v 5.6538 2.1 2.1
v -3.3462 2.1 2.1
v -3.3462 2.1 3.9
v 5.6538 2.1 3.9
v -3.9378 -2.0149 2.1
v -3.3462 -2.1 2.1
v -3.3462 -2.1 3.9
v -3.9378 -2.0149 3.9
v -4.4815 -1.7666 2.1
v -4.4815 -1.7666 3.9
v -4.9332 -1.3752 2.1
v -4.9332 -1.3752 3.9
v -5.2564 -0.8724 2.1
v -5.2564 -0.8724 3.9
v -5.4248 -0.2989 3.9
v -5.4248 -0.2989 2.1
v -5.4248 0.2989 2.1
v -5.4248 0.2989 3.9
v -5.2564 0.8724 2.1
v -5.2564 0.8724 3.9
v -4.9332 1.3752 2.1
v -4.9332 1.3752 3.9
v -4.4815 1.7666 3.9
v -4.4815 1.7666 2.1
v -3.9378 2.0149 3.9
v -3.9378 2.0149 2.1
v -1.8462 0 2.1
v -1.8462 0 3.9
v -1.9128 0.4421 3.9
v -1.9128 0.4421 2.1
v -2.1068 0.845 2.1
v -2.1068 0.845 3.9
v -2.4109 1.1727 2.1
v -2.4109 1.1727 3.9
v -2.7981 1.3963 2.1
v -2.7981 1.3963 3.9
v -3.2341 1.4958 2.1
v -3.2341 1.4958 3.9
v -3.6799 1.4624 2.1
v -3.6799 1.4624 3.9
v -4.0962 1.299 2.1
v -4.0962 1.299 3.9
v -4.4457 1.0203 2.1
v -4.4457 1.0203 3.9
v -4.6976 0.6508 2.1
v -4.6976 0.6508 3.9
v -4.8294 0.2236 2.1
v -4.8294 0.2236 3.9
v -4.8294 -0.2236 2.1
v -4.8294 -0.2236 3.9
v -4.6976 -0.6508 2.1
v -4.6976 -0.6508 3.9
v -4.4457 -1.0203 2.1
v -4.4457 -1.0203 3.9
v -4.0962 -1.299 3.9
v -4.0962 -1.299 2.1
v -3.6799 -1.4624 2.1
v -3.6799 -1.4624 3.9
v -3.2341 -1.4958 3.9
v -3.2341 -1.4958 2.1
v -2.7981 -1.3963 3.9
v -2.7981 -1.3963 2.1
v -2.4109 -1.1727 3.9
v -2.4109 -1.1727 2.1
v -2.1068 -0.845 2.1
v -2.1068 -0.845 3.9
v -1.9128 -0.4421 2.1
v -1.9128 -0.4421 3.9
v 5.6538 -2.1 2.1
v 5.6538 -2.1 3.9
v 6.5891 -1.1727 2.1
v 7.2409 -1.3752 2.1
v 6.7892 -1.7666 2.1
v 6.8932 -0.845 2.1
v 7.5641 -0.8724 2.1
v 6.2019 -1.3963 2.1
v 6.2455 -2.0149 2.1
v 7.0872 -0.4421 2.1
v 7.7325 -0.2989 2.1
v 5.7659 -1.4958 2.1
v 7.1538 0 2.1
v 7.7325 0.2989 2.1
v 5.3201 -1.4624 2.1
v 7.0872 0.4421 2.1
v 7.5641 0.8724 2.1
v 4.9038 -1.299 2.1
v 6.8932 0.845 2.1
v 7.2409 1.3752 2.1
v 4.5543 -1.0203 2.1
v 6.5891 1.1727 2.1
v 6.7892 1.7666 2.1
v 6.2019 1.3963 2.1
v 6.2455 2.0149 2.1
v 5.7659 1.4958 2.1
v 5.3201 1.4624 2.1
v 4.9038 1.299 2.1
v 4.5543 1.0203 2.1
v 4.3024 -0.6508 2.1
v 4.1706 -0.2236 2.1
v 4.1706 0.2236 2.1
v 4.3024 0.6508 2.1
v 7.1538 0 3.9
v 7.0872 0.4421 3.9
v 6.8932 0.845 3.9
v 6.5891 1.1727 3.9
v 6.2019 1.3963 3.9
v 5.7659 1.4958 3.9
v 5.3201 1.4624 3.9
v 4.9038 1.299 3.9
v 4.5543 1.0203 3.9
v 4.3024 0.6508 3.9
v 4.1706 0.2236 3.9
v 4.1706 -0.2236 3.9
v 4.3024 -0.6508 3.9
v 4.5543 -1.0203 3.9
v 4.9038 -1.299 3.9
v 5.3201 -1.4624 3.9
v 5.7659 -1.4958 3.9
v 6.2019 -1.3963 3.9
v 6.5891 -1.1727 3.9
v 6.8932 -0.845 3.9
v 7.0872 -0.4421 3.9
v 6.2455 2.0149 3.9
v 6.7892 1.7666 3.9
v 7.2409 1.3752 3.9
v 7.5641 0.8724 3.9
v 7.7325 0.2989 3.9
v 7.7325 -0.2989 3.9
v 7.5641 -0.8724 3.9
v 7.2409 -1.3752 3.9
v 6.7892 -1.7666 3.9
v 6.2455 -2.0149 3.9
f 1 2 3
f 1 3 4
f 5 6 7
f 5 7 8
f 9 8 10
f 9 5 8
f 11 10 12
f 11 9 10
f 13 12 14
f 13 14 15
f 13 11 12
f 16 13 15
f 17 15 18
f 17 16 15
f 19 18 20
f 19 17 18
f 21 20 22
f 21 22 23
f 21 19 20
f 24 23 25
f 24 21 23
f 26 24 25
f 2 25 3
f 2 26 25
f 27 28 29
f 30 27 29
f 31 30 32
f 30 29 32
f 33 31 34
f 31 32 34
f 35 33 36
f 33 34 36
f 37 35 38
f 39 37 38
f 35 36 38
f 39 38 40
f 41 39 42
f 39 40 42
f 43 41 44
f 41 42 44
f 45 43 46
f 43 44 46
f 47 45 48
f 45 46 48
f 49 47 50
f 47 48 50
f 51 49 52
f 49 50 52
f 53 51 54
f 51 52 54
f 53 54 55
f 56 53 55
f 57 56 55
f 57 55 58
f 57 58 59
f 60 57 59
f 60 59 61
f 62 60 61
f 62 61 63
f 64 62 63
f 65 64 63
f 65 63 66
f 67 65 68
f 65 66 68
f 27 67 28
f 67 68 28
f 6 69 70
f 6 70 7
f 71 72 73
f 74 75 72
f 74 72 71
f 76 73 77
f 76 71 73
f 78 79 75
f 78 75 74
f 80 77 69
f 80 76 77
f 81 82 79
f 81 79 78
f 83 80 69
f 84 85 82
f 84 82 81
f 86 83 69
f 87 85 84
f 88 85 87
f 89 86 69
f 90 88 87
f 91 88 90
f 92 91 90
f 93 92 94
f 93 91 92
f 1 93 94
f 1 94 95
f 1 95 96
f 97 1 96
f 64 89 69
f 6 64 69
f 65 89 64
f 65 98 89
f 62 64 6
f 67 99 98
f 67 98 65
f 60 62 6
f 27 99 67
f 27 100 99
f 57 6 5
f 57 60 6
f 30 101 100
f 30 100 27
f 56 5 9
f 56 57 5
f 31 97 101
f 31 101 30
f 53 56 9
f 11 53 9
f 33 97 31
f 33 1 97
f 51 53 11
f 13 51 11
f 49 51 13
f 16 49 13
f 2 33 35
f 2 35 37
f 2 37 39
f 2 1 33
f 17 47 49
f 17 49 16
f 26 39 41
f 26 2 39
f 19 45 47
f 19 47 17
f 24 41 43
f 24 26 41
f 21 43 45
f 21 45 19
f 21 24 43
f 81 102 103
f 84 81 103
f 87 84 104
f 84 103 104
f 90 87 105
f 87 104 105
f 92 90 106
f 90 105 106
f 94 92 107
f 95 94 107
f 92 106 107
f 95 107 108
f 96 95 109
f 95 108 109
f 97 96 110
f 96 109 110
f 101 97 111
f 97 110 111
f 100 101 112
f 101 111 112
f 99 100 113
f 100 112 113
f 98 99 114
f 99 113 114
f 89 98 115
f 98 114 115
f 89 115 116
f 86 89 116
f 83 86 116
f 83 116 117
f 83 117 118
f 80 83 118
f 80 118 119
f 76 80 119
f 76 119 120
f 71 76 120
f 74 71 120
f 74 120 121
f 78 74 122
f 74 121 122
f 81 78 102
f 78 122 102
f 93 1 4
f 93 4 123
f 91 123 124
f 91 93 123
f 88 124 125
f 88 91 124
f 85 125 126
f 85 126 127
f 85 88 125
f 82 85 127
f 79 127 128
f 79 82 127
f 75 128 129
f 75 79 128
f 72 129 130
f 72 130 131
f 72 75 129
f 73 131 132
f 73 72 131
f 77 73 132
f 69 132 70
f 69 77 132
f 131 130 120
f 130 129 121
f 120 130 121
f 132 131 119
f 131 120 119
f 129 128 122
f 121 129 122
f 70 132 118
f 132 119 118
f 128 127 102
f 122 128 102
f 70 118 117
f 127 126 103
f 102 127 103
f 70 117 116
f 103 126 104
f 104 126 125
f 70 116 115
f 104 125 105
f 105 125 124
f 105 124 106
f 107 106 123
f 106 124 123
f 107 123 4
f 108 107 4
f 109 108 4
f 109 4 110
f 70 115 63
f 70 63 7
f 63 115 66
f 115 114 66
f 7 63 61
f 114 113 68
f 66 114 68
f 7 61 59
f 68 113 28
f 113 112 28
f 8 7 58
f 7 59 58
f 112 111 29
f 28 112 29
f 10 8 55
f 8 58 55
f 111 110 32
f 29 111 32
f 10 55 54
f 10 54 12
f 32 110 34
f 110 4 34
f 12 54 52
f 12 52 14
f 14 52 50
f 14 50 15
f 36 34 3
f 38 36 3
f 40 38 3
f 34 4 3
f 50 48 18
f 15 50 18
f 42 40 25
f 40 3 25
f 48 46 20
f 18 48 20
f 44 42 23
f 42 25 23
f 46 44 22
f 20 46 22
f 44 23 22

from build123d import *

# Parameters (mm, degrees)
BOSS_EXTRUDE1_DEPTH = 6
SKETCH2_R           = 5
CUT_EXTRUDE1_DEPTH  = 6
SCALE1_SCALE        = 0.3


with BuildPart() as part:
    # Sketch1 → Boss-Extrude1 (new body)
    with BuildSketch(Plane.XY):
        with BuildLine():
            Line((-13.846153846, 7), (16.153846154, 7))
            ThreePointArc((16.153846154, 7), (23.153846154, 0), (16.153846154, -7))
            Line((16.153846154, -7), (-13.846153846, -7))
            ThreePointArc((-13.846153846, -7), (-20.846153846, 0), (-13.846153846, 7))
        make_face()
    extrude(amount=BOSS_EXTRUDE1_DEPTH)

    # Sketch2 → Cut-Extrude1 (cut)
    with BuildSketch(Plane.XY.offset(6)):
        with Locations((-13.846153846, 0)):
            Circle(SKETCH2_R)
        with Locations((16.153846154, 0)):
            Circle(SKETCH2_R)
    extrude(amount=-CUT_EXTRUDE1_DEPTH, mode=Mode.SUBTRACT)


with BuildPart() as part_1:
    # Scale1: scaled about (1.153846154, 0, 3)
    add(part.part.scale(SCALE1_SCALE).moved(Location((0.807692308, 0, 2.1))))


solid = part_1.part
